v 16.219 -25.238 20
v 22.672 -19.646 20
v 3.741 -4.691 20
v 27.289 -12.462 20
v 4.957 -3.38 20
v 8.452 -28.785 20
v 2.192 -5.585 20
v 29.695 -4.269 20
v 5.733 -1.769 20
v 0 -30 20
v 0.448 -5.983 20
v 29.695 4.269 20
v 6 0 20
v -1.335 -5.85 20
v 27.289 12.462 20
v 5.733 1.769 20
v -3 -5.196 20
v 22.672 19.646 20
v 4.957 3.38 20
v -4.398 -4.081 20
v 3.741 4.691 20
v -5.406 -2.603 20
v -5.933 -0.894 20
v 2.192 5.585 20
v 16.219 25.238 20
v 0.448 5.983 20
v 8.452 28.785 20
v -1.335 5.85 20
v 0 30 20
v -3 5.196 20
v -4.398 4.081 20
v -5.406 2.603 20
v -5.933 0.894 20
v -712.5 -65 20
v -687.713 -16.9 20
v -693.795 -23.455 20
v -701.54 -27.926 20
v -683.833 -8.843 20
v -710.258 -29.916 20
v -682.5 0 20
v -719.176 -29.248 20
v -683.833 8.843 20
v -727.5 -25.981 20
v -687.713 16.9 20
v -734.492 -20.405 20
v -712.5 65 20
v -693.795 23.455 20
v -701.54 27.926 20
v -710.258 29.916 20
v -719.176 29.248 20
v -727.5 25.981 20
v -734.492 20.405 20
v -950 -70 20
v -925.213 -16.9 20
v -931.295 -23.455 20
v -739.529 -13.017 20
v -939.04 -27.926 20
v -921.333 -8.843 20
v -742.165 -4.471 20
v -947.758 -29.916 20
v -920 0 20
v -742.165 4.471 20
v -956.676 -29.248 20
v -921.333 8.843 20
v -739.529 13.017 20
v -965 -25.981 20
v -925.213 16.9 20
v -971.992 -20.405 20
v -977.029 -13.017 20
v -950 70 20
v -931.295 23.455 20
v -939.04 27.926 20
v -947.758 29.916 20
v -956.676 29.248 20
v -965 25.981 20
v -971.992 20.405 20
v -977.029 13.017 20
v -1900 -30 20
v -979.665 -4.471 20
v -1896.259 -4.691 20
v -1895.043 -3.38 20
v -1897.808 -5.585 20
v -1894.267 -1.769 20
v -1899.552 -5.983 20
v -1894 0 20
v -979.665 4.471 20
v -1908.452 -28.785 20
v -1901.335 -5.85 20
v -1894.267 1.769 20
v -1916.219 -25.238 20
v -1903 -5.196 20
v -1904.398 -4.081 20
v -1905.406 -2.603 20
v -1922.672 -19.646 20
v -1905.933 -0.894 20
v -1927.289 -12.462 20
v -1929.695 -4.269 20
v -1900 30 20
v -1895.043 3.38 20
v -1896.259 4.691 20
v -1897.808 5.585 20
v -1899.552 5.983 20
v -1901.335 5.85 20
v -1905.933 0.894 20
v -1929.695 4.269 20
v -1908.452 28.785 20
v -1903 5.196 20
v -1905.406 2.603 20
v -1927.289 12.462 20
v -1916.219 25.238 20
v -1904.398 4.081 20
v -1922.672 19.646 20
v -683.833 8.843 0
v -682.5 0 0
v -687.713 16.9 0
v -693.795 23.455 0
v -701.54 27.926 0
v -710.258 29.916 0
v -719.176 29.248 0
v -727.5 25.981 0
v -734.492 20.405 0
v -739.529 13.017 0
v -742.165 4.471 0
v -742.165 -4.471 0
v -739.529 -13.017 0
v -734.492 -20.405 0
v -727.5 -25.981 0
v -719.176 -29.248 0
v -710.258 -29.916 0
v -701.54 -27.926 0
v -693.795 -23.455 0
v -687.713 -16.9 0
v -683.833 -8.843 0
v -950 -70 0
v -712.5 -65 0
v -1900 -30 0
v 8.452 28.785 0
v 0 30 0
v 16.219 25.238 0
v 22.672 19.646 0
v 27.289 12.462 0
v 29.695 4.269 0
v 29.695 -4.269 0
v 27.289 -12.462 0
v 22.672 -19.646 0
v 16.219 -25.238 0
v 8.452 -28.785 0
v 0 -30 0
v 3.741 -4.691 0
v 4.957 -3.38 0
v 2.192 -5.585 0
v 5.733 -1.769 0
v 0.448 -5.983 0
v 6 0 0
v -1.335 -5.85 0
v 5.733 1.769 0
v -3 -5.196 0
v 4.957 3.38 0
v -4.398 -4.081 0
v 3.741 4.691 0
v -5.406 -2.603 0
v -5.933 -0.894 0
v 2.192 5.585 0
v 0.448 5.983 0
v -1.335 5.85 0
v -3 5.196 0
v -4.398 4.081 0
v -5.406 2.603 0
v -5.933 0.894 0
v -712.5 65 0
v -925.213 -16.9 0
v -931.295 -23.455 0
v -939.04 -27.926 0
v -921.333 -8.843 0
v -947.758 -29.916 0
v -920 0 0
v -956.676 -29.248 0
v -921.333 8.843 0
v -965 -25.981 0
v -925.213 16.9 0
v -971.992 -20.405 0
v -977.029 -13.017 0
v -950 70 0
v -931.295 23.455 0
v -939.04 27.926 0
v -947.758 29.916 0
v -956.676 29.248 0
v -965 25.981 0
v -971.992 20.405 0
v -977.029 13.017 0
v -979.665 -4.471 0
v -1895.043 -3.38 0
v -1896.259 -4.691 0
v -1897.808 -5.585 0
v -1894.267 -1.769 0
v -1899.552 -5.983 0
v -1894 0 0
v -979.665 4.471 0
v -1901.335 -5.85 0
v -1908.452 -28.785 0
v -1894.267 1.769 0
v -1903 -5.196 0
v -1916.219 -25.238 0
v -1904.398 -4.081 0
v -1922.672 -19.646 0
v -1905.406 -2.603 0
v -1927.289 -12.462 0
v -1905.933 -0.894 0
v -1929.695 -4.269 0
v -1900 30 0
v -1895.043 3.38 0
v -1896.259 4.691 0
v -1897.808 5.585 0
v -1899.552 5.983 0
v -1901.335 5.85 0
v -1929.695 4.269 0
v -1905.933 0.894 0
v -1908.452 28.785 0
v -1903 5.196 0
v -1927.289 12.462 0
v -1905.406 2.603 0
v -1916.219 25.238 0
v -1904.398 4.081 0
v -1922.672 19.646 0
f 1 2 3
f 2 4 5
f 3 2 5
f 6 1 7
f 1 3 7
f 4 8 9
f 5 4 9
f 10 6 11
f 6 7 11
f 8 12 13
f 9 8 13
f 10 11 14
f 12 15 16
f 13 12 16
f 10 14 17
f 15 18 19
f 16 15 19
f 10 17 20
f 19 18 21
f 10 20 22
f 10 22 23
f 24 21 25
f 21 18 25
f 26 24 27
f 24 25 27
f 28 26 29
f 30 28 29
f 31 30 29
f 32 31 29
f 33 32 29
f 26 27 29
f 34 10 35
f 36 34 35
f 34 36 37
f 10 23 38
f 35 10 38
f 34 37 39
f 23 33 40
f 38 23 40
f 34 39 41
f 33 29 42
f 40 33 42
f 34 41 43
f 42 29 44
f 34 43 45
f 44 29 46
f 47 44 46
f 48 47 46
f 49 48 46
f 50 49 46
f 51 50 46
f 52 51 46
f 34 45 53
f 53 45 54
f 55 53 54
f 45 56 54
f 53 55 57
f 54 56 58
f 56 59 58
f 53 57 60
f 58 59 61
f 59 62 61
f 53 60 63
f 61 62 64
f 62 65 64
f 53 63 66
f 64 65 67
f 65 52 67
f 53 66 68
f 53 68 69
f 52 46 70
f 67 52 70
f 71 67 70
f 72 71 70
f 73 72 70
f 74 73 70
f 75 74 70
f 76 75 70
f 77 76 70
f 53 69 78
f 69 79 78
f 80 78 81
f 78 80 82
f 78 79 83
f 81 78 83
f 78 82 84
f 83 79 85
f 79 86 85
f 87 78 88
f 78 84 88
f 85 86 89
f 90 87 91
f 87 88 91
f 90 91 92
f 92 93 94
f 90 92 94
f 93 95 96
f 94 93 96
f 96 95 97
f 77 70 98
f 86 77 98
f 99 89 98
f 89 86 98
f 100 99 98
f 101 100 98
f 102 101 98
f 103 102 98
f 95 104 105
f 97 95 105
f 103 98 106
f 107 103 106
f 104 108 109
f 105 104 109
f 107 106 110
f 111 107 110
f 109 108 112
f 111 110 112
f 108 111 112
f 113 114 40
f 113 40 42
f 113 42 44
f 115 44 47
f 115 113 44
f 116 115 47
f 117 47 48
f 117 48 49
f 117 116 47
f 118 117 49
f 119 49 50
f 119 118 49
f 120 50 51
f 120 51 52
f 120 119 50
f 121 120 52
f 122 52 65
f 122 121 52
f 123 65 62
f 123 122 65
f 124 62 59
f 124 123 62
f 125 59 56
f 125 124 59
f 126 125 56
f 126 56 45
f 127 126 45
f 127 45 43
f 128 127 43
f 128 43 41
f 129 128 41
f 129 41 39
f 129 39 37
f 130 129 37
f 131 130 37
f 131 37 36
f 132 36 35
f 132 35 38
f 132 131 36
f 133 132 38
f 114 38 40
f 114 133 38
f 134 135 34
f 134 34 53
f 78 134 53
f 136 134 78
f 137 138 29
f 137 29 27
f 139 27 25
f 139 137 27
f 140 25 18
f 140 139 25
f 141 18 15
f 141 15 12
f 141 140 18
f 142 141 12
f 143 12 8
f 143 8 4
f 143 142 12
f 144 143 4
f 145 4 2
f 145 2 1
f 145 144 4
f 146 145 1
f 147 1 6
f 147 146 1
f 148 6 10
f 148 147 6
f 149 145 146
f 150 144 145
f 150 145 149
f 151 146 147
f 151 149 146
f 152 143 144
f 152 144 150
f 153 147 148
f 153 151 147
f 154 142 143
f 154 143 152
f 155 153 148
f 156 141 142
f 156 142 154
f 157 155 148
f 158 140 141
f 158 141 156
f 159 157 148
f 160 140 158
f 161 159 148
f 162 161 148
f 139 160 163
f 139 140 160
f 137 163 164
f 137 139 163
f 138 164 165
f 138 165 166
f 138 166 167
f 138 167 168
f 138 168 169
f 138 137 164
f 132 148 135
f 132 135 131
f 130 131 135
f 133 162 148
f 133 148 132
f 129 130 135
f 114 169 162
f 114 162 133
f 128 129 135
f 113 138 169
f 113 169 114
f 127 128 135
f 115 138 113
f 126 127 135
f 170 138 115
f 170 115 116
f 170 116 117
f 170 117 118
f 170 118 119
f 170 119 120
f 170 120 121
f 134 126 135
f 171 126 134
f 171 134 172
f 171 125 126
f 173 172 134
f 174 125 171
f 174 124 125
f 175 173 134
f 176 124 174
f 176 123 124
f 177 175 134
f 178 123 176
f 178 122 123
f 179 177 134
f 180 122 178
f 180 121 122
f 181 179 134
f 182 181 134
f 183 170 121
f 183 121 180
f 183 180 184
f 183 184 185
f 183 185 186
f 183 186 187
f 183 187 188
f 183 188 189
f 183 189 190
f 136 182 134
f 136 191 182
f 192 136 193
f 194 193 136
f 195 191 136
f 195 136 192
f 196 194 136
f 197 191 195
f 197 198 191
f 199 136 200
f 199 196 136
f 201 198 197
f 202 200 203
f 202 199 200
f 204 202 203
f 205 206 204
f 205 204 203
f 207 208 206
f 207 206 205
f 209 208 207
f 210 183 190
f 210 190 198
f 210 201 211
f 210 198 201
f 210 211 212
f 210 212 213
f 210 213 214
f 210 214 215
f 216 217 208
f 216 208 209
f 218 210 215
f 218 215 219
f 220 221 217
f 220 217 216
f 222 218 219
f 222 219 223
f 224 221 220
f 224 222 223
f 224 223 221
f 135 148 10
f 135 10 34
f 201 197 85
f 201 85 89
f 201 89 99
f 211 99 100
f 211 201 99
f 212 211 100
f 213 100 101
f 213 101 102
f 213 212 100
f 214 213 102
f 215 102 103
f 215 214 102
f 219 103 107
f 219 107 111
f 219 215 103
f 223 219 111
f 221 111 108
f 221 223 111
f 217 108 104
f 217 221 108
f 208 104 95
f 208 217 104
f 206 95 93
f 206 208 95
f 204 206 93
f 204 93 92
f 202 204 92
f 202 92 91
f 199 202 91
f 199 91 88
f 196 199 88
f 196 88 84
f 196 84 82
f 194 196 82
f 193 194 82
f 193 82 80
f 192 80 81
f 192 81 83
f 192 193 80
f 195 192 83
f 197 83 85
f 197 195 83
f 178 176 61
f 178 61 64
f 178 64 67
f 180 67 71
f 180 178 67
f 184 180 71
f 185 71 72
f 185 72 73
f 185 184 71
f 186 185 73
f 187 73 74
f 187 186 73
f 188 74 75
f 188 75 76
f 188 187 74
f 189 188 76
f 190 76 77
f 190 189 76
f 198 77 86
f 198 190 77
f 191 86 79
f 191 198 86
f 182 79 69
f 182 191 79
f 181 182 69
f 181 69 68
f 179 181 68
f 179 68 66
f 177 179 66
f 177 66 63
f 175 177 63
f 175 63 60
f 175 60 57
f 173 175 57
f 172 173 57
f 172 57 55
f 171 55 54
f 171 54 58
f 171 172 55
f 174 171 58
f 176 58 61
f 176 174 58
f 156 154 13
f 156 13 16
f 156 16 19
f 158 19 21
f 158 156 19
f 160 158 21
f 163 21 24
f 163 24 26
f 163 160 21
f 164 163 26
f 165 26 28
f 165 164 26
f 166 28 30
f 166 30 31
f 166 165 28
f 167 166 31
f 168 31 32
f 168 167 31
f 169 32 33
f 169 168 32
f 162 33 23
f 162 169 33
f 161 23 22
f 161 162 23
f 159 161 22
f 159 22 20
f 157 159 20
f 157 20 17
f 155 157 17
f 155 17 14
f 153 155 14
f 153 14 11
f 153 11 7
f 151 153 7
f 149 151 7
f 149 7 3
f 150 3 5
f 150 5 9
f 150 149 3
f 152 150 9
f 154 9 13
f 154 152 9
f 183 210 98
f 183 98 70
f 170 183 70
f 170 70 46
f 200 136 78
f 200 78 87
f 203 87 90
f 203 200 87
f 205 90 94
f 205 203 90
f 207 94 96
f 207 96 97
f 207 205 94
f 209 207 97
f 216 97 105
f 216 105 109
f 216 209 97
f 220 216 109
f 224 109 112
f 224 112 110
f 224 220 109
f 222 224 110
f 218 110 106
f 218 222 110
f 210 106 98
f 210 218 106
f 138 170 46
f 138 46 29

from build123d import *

# Parameters (mm, degrees)
SKIZZE1_R                       = 30
SKIZZE1_R_2                     = 6
AUFSATZ_LINEAR_AUSTRAGEN1_DEPTH = 20


with BuildPart() as part:
    # Skizze1 → Aufsatz-Linear austragen1 (new body)
    with BuildSketch(Plane.XY):
        with BuildLine():
            Line((-950, 70), (-712.5, 65))
            Line((-712.5, 65), (0, 30))
            ThreePointArc((0, 30), (30, 0), (0, -30))
            Line((0, -30), (-712.5, -65))
            Line((-712.5, -65), (-950, -70))
            Line((-950, -70), (-1900, -30))
            ThreePointArc((-1900, -30), (-1930, 0), (-1900, 30))
            Line((-1900, 30), (-950, 70))
        make_face()
        with Locations((-950, 0)):
            Circle(SKIZZE1_R, mode=Mode.SUBTRACT)
        with Locations((-712.5, 0)):
            Circle(SKIZZE1_R, mode=Mode.SUBTRACT)
        with Locations((-1900, 0)):
            Circle(SKIZZE1_R_2, mode=Mode.SUBTRACT)
        Circle(SKIZZE1_R_2, mode=Mode.SUBTRACT)
    extrude(amount=AUFSATZ_LINEAR_AUSTRAGEN1_DEPTH)


solid = part.part
